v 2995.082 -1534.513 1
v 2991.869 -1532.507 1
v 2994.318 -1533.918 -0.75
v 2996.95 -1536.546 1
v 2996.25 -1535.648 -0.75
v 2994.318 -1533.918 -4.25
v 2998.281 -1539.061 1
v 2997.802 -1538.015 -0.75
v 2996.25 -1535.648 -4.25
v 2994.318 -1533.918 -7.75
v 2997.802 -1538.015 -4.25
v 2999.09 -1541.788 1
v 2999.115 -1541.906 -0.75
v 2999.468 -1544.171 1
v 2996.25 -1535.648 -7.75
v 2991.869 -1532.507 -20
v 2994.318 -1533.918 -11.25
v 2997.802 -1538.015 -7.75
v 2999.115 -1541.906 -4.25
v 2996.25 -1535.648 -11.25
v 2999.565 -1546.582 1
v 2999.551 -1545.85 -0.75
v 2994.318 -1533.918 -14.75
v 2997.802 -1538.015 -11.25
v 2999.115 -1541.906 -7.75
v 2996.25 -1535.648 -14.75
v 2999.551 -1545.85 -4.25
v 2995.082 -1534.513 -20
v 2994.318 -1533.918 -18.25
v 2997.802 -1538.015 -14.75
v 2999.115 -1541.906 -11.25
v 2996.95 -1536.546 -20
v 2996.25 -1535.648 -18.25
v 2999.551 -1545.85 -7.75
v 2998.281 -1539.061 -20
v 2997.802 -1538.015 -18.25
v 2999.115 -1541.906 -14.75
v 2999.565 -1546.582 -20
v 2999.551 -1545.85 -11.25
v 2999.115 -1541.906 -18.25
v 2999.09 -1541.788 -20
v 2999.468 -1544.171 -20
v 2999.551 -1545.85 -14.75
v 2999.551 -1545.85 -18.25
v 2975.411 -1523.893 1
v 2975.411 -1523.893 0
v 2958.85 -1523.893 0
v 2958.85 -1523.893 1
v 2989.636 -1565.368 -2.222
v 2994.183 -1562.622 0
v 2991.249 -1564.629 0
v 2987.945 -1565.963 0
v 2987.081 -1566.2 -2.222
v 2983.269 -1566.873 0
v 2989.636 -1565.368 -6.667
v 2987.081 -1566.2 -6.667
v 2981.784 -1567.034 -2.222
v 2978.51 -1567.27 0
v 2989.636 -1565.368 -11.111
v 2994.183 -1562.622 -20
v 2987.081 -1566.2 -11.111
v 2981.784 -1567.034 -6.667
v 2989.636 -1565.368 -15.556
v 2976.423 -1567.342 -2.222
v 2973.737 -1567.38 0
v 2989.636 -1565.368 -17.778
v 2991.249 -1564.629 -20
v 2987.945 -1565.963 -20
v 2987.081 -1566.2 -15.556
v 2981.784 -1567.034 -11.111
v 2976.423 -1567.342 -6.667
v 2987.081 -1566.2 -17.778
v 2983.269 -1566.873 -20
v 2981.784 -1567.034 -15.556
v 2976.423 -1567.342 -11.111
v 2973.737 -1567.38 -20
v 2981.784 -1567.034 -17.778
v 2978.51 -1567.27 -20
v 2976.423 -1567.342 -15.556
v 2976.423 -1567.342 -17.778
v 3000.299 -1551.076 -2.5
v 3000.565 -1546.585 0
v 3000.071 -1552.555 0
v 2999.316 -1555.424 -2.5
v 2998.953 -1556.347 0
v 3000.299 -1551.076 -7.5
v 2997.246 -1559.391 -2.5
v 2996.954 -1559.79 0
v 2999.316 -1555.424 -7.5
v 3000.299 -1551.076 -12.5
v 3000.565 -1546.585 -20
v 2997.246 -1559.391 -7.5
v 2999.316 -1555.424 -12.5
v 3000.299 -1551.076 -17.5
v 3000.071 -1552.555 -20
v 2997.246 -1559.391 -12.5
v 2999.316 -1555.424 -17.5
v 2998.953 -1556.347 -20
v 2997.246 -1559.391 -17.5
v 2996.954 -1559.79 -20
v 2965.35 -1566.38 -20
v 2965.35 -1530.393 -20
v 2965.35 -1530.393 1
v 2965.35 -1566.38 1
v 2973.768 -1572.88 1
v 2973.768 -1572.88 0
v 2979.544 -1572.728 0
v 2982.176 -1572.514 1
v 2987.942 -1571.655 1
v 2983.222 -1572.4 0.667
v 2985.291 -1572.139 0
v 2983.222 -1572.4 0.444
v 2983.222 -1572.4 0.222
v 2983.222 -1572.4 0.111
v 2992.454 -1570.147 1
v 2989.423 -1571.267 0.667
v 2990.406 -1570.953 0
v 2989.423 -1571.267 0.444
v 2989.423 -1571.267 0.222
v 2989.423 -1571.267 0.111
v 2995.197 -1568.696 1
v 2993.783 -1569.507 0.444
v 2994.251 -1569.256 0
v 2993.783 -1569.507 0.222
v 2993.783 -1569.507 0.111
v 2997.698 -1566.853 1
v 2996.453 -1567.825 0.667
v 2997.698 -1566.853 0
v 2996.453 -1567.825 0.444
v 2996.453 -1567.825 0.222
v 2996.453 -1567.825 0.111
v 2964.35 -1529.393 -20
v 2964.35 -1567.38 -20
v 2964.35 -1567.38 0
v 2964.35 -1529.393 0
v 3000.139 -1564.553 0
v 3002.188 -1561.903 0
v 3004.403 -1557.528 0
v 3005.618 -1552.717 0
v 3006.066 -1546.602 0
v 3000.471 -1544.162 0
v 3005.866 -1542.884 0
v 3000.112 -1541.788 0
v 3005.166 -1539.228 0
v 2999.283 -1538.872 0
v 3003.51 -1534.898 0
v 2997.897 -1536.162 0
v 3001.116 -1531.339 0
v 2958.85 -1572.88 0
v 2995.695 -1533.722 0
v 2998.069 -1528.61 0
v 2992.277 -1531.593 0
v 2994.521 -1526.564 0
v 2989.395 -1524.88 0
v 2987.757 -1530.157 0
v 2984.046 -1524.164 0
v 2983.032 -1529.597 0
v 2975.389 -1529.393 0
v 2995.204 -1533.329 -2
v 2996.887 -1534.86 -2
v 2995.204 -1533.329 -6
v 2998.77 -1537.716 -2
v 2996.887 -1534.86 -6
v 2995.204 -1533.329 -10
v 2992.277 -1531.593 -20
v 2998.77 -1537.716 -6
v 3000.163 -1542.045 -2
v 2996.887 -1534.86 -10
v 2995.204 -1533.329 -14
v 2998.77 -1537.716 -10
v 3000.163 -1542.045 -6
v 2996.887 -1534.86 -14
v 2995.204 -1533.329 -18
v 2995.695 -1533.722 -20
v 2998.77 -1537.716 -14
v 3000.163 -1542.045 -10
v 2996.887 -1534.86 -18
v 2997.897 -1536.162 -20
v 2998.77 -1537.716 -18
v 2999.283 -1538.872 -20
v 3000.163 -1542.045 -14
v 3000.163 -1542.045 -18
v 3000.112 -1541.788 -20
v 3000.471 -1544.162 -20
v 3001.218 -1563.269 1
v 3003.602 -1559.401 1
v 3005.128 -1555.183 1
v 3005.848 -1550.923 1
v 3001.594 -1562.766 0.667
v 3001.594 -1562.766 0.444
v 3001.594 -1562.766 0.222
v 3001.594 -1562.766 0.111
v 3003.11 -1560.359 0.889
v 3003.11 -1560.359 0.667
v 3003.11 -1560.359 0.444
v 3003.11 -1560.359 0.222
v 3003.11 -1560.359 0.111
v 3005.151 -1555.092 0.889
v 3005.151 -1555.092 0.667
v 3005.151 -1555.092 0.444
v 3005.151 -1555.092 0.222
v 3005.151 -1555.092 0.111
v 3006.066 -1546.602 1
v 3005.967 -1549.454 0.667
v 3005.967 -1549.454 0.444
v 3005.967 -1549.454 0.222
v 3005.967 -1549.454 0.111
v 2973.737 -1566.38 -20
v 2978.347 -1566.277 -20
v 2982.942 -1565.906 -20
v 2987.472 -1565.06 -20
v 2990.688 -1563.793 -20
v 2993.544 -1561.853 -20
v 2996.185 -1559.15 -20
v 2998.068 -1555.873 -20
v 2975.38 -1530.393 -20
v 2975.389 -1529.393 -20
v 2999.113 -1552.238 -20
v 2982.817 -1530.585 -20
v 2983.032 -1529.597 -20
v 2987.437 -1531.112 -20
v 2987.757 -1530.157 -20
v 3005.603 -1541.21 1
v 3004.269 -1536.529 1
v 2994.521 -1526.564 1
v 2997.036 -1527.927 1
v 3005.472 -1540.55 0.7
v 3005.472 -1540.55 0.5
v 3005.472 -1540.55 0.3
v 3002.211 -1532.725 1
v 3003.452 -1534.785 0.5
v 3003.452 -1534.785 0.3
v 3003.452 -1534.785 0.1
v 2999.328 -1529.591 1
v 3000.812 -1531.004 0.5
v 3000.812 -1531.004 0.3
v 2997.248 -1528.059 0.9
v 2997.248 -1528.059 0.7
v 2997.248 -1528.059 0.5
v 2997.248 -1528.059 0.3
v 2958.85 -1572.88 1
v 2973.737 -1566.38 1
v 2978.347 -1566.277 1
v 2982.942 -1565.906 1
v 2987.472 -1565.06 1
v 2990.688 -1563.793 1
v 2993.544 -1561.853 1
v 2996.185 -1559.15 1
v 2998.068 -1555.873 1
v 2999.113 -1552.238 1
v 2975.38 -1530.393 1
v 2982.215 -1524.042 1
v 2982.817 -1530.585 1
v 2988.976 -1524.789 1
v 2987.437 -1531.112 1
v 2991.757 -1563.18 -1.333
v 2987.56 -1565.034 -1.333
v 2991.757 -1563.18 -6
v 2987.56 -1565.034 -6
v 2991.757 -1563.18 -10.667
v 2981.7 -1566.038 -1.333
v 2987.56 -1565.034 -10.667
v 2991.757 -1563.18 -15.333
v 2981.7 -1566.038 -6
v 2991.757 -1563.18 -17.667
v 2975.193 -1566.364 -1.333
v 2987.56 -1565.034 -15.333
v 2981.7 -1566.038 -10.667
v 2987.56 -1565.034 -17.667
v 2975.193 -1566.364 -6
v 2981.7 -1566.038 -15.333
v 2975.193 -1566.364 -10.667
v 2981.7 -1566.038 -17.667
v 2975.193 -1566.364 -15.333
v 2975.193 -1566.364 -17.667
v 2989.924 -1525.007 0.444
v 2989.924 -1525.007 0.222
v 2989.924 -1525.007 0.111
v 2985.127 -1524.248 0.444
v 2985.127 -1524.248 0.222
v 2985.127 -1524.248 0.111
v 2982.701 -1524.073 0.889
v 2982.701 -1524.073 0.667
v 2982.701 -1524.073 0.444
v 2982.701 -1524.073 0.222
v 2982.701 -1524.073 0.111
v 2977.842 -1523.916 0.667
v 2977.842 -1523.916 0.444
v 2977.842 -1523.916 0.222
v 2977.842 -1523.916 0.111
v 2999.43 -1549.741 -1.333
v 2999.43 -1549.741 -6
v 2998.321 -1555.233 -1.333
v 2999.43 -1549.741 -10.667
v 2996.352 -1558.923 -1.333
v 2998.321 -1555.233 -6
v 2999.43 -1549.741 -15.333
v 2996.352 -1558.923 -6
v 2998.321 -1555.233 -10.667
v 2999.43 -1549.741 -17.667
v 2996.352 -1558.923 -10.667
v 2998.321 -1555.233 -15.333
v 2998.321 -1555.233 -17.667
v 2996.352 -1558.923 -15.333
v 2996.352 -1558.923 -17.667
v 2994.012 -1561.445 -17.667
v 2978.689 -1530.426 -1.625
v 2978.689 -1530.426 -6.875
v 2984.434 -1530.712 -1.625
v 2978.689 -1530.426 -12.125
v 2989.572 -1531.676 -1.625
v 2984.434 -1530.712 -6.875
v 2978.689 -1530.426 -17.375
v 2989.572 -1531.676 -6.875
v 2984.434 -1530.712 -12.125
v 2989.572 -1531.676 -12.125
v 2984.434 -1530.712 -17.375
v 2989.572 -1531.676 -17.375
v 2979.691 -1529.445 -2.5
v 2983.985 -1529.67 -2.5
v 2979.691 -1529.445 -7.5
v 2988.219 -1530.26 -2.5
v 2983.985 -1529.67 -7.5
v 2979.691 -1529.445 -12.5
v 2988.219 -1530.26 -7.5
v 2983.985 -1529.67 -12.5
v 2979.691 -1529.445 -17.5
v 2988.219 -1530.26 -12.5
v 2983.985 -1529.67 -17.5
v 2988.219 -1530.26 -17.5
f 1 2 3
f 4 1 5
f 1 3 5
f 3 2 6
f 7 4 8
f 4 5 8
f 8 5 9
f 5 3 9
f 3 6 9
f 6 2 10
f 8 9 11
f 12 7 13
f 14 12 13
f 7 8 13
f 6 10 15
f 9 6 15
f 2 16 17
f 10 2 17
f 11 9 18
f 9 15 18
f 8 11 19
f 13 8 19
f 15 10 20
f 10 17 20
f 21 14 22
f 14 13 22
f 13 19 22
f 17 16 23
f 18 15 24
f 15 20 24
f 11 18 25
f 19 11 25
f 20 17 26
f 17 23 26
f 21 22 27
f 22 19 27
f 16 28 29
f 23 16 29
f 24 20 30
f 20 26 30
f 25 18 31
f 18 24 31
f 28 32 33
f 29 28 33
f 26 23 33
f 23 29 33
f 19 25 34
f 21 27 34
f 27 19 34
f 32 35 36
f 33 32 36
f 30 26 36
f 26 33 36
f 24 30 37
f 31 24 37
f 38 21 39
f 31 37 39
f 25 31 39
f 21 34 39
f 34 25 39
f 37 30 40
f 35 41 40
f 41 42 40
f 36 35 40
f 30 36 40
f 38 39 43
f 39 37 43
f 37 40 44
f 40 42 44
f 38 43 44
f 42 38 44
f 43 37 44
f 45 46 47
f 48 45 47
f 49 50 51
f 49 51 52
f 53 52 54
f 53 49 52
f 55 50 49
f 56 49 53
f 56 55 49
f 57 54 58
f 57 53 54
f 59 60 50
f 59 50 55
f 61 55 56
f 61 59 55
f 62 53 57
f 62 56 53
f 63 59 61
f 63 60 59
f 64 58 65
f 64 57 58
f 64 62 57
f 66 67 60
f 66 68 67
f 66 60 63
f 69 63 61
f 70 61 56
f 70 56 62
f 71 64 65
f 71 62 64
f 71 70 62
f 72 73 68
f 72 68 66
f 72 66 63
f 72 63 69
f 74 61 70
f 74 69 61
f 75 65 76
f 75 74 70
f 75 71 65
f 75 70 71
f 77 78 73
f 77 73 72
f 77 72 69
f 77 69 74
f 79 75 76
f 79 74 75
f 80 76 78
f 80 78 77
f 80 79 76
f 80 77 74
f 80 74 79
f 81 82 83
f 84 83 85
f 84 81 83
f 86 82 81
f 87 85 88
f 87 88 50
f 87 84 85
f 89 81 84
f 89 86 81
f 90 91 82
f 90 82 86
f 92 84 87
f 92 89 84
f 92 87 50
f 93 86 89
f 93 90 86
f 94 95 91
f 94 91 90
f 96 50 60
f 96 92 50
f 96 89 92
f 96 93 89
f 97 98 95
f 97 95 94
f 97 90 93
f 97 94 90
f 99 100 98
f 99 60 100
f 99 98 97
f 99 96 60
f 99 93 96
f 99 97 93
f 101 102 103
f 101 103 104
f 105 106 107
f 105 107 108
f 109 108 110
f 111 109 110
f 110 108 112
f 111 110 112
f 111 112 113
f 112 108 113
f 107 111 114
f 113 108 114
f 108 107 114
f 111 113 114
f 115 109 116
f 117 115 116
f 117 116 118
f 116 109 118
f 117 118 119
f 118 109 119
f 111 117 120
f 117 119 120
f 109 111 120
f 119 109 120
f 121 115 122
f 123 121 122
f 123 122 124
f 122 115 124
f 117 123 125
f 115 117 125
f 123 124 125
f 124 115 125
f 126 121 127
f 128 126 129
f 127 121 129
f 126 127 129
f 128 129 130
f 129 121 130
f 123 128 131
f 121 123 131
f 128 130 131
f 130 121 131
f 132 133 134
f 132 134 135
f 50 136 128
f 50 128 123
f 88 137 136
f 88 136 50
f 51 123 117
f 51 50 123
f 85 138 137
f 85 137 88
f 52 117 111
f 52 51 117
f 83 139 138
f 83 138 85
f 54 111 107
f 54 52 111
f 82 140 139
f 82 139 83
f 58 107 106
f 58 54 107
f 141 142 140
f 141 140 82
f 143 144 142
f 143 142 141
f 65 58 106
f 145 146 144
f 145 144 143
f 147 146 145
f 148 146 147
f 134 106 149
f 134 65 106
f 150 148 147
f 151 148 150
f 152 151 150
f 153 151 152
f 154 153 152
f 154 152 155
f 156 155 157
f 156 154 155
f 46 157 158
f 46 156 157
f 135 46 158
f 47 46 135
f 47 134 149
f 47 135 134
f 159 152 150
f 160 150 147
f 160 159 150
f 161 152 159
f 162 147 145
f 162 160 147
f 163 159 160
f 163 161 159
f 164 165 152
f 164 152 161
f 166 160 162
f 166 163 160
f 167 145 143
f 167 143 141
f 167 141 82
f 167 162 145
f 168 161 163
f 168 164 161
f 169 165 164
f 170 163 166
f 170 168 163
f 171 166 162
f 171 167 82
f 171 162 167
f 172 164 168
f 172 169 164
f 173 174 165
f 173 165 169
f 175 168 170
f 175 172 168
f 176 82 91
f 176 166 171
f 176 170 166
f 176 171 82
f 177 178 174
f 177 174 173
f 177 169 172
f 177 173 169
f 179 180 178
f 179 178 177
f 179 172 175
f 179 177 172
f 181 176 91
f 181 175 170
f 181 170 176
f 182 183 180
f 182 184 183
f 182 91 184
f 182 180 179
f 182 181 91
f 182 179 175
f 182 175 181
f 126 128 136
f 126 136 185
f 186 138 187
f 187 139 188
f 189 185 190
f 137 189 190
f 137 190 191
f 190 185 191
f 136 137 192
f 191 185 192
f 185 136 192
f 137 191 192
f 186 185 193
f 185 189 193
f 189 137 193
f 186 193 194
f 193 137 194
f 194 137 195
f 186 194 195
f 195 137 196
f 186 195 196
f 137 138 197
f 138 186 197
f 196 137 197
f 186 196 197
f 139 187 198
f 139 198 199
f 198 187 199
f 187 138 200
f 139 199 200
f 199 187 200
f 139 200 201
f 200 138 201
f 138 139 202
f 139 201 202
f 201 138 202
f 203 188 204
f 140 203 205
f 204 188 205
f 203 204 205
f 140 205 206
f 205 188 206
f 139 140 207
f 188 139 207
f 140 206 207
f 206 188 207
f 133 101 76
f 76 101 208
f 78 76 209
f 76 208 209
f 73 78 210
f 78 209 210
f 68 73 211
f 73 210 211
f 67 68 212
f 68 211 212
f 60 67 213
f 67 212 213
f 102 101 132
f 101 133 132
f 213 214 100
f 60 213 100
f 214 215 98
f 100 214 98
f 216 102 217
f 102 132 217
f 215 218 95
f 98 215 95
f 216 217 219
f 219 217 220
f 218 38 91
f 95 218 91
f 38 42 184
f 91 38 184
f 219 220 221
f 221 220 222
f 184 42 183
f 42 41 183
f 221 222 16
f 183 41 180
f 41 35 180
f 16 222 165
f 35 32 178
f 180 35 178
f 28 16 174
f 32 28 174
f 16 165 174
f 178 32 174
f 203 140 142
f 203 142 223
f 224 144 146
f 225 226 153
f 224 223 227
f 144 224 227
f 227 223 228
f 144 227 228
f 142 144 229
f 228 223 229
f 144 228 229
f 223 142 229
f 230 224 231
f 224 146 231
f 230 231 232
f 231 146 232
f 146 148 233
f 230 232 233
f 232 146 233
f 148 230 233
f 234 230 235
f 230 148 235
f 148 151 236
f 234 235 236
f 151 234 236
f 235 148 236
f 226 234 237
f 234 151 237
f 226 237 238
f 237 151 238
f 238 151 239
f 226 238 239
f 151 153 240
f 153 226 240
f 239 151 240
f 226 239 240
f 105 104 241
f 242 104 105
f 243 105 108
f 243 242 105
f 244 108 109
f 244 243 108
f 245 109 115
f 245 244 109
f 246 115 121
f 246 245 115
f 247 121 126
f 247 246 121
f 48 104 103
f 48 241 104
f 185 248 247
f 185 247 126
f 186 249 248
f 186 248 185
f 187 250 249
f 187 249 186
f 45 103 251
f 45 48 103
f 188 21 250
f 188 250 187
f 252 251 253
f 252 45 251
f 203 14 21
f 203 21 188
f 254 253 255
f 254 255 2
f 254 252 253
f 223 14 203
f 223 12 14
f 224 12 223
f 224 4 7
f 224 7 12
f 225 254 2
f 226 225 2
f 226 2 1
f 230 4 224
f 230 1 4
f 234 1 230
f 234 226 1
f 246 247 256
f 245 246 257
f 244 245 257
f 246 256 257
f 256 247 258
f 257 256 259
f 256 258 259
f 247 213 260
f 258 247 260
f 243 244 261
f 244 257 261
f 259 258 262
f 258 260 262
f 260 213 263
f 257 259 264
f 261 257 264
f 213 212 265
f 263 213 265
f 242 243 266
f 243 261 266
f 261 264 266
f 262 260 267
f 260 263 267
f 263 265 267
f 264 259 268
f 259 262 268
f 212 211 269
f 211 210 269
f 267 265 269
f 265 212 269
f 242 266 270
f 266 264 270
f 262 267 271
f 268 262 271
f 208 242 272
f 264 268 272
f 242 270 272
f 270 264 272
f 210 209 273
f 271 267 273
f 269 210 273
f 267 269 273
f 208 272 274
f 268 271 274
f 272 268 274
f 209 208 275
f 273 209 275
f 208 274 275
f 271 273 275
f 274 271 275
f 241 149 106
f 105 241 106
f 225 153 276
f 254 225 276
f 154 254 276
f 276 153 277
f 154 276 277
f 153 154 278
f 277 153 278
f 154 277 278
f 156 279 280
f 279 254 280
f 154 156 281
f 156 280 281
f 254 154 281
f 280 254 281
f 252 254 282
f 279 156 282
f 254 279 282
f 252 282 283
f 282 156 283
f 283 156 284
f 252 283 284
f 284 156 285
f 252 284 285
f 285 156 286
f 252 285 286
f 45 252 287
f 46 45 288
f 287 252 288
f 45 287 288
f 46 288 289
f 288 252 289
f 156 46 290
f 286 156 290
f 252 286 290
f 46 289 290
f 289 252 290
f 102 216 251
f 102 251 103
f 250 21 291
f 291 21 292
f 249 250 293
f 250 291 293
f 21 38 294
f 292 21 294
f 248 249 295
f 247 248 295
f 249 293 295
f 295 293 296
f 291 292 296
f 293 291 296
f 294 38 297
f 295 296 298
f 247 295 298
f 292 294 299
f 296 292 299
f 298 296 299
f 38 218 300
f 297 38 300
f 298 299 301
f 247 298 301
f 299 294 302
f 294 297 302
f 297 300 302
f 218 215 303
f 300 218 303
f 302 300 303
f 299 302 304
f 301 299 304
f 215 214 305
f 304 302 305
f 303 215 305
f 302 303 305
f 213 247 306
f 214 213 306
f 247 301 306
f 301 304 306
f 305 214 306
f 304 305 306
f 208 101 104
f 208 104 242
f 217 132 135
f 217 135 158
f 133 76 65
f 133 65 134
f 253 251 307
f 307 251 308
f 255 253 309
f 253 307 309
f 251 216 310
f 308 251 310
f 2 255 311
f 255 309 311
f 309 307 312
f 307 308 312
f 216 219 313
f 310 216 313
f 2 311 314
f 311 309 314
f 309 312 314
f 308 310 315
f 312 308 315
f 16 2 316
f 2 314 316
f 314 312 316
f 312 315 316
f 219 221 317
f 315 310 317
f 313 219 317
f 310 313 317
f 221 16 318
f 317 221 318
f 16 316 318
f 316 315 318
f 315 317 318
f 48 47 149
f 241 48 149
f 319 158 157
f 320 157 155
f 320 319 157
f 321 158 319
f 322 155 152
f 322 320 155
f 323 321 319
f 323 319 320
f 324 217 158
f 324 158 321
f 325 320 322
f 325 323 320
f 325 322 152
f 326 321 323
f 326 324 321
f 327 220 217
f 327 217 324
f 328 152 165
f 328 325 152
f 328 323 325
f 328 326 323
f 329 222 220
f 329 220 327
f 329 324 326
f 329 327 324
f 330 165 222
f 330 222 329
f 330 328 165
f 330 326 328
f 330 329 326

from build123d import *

# Parameters (mm, degrees)
BOSS_EXTRUDE1_DEPTH      = 1
BOSS_EXTRUDE1_DEPTH_BACK = 20
CUT_EXTRUDE1_START       = -20
CUT_EXTRUDE1_DEPTH       = 21
CUT_EXTRUDE2_DEPTH       = 20


with BuildPart() as part:
    # Sketch1 → Boss-Extrude1 (new, two sides: drawn at the far end of the back side and taken through both)
    with BuildSketch(Plane.XY.offset(-BOSS_EXTRUDE1_DEPTH_BACK)):
        with BuildLine():
            Line((2958.849681818, -1523.892686603), (2958.849681818, -1572.880046193))
            Line((2958.849681818, -1572.880046193), (2973.767827756, -1572.879891925))
            add(Edge.make_bspline(
                [(2973.767827756, -1572.879891925), (2975.872692571, -1572.860128702), (2977.97744433, -1572.837038501), (2981.128456873, -1572.622449637), (2982.176837562, -1572.520411147), (2984.266901408, -1572.279675791), (2985.310881123, -1572.151531628), (2987.385467262, -1571.796406217), (2988.418665053, -1571.564661717), (2990.42772202, -1570.970030606), (2991.407545952, -1570.607613705), (2992.843658133, -1569.975383258), (2993.316892991, -1569.750227353), (2994.249877125, -1569.26437839), (2994.710462552, -1569.002807433), (2995.600777329, -1568.440961858), (2996.03179999, -1568.139919647), (2996.874381171, -1567.510129893), (2997.286151137, -1567.181683323), (2997.698061708, -1566.853436892)],
                knots=[0, 0, 0, 0, 0.25, 0.25, 0.375, 0.375, 0.5, 0.5, 0.625, 0.625, 0.75, 0.75, 0.8125, 0.8125, 0.875, 0.875, 0.9375, 0.9375, 1, 1, 1, 1], degree=3))
            add(Edge.make_bspline(
                [(2997.698061708, -1566.853436892), (2998.416858499, -1566.231137048), (2999.132070809, -1565.605801223), (3000.439874878, -1564.251272502), (3001.040833723, -1563.529166355), (3001.870136359, -1562.384909745), (3002.134518134, -1561.99328271), (3002.639885881, -1561.190212879), (3002.88181464, -1560.777345774), (3003.56629642, -1559.520937412), (3003.965060607, -1558.663443678), (3004.645255929, -1556.907913122), (3004.925665177, -1556.009523199), (3005.375924175, -1554.174540788), (3005.547442261, -1553.235046422), (3005.815340161, -1551.349261322), (3005.909922946, -1550.403292778), (3006.024485076, -1548.505526326), (3006.044953808, -1547.553766658), (3006.065724013, -1546.602030546)],
                knots=[0, 0, 0, 0, 0.125, 0.125, 0.25, 0.25, 0.3125, 0.3125, 0.375, 0.375, 0.5, 0.5, 0.625, 0.625, 0.75, 0.75, 0.875, 0.875, 1, 1, 1, 1], degree=3))
            add(Edge.make_bspline(
                [(3006.065724013, -1546.602030546), (3006.04972175, -1545.577792039), (3006.031144664, -1544.554036514), (3005.843675505, -1542.534721285), (3005.678530811, -1541.538458655), (3005.265660908, -1539.561423704), (3005.017072922, -1538.580813221), (3004.349249805, -1536.651601947), (3003.927156281, -1535.69691585), (3002.976116906, -1533.87389373), (3002.441259888, -1533.000385871), (3001.502343695, -1531.777630592), (3001.167345475, -1531.384044934), (3000.455968626, -1530.623807652), (3000.085403132, -1530.263220064), (2998.936287392, -1529.230582402), (2998.119310629, -1528.608979786), (2996.812178732, -1527.783790373), (2996.362427394, -1527.526882528), (2995.447591339, -1527.034344288), (2994.984254165, -1526.799477811), (2994.521463917, -1526.563557737)],
                knots=[0, 0, 0, 0, 0.125, 0.125, 0.25, 0.25, 0.375, 0.375, 0.5, 0.5, 0.625, 0.625, 0.6875, 0.6875, 0.75, 0.75, 0.875, 0.875, 0.9375, 0.9375, 1, 1, 1, 1], degree=3))
            add(Edge.make_bspline(
                [(2994.521463917, -1526.563557737), (2993.765688091, -1526.272085638), (2993.010491549, -1525.978829783), (2991.483205477, -1525.44433573), (2990.710657636, -1525.204508785), (2989.138204589, -1524.809094938), (2988.339258152, -1524.653193843), (2986.738448585, -1524.406676163), (2985.933779187, -1524.317100974), (2984.722952021, -1524.212934338), (2984.318693535, -1524.183341594), (2983.509822186, -1524.126955112), (2983.105306438, -1524.099165519), (2981.891730085, -1524.019688984), (2981.082356745, -1523.977557139), (2979.462489648, -1523.931004115), (2978.652062316, -1523.924347209), (2977.031290954, -1523.90822966), (2976.220898612, -1523.900395057), (2975.410500017, -1523.892770911)],
                knots=[0, 0, 0, 0, 0.125, 0.125, 0.25, 0.25, 0.375, 0.375, 0.5, 0.5, 0.5625, 0.5625, 0.625, 0.625, 0.75, 0.75, 0.875, 0.875, 1, 1, 1, 1], degree=3))
            Line((2975.410500017, -1523.892770911), (2958.849681818, -1523.892686603))
        make_face()
    extrude(amount=BOSS_EXTRUDE1_DEPTH + BOSS_EXTRUDE1_DEPTH_BACK)

    # Cut-Extrude1: read off the stored shape, not the designer's step
    # Cut-Extrude1 outline → Cut-Extrude1 (cut)
    with BuildSketch(Plane.XY.offset(CUT_EXTRUDE1_START)):
        with BuildLine():
            add(Edge.make_bspline(
                [(2999.564611356, -1546.581932516), (2999.560199289, -1546.783286703), (2999.555713556, -1546.984640418), (2999.550951057, -1547.185992362), (2999.534489795, -1547.818236531), (2999.511294548, -1548.450437603), (2999.490831378, -1548.881110798), (2999.426611827, -1549.918234738), (2999.317611548, -1550.952232563), (2999.236483512, -1551.555232979), (2999.050783989, -1552.664033717), (2998.792033815, -1553.759793947), (2998.6557005, -1554.257958858), (2998.364859869, -1555.173667396), (2997.997352466, -1556.061024659), (2997.811925548, -1556.465364546), (2997.43514021, -1557.215812724), (2997.011924898, -1557.940652406), (2996.802455573, -1558.275235324), (2996.352584868, -1558.945006303), (2995.85768673, -1559.583161975), (2995.59297997, -1559.899565762), (2995.129592401, -1560.411063384), (2994.63189911, -1560.888356369), (2994.427352751, -1561.076325072), (2994.127451293, -1561.344110455), (2993.824926371, -1561.608514143), (2993.731268531, -1561.689977202), (2993.637497837, -1561.77129479), (2993.543683098, -1561.852555602)],
                knots=[0, 0, 0, 0, 0, 0, 0.059110167, 0.059110167, 0.059110167, 0.18560848, 0.18560848, 0.18560848, 0.363995279, 0.363995279, 0.363995279, 0.515214101, 0.515214101, 0.515214101, 0.645558691, 0.645558691, 0.645558691, 0.761279311, 0.761279311, 0.761279311, 0.882110137, 0.882110137, 0.882110137, 0.9635736, 0.9635736, 0.9635736, 1, 1, 1, 1, 1, 1], degree=5))
            add(Edge.make_bspline(
                [(2991.86894481, -1532.507311664), (2991.917727188, -1532.532220868), (2991.966502744, -1532.557143307), (2992.015269625, -1532.582082572), (2992.251762506, -1532.703149616), (2992.487964167, -1532.824781606), (2992.674876093, -1532.922484624), (2993.125152768, -1533.163819253), (2993.567139203, -1533.421165934), (2993.822697838, -1533.578813476), (2994.295211081, -1533.89045171), (2994.745988195, -1534.232754351), (2994.953066018, -1534.399748188), (2995.348862625, -1534.737107468), (2995.727539885, -1535.093636559), (2995.9075968, -1535.272751981), (2996.258392012, -1535.643974504), (2996.582901118, -1536.038753857), (2996.739291373, -1536.242815654), (2997.069559841, -1536.705108563), (2997.364851967, -1537.189961311), (2997.517596496, -1537.460995945), (2997.841182076, -1538.074085206), (2998.135390571, -1538.70208923), (2998.286730018, -1539.052742318), (2998.586377385, -1539.820367574), (2998.818630505, -1540.610699075), (2998.927804824, -1541.039958158), (2999.12917984, -1541.932899013), (2999.297418906, -1542.832012438), (2999.372220021, -1543.297429752), (2999.47290564, -1544.085611102), (2999.521569818, -1544.87895901), (2999.534967442, -1545.202600808), (2999.548302092, -1545.672889571), (2999.55740139, -1546.142922786), (2999.559941505, -1546.289267601), (2999.562305702, -1546.435601801), (2999.564611356, -1546.581932516)],
                knots=[0, 0, 0, 0, 0, 0, 0.016030085, 0.016030085, 0.016030085, 0.077753986, 0.077753986, 0.077753986, 0.16552737, 0.16552737, 0.16552737, 0.243297834, 0.243297834, 0.243297834, 0.317540058, 0.317540058, 0.317540058, 0.392660664, 0.392660664, 0.392660664, 0.483601528, 0.483601528, 0.483601528, 0.595188602, 0.595188602, 0.595188602, 0.724612519, 0.724612519, 0.724612519, 0.862455293, 0.862455293, 0.862455293, 0.957170285, 0.957170285, 0.957170285, 1, 1, 1, 1, 1, 1], degree=5))
            add(Edge.make_bspline(
                [(2975.379908678, -1530.392770753), (2975.635320758, -1530.395173553), (2975.890732771, -1530.397574462), (2976.146143794, -1530.399947135), (2976.8080658, -1530.40595474), (2977.469968724, -1530.411418814), (2977.87646884, -1530.415148123), (2978.89820325, -1530.426914914), (2979.920008426, -1530.448352542), (2980.53513518, -1530.466136469), (2981.684749787, -1530.511066357), (2982.832663167, -1530.582616061), (2983.366418547, -1530.621116564), (2984.420849653, -1530.706422764), (2985.4751468, -1530.807833622), (2985.994763952, -1530.86696457), (2987.032496202, -1531.013952985), (2988.056756518, -1531.238439658), (2988.566475319, -1531.3687841), (2989.402610593, -1531.61104315), (2990.225391079, -1531.892622818), (2990.549250324, -1532.008765811), (2991.007473299, -1532.178445738), (2991.464114808, -1532.351995365), (2991.599123107, -1532.403608526), (2991.734055949, -1532.455406322), (2991.86894481, -1532.507311664)],
                knots=[0, 0, 0, 0, 0, 0, 0.076276008, 0.076276008, 0.076276008, 0.197678027, 0.197678027, 0.197678027, 0.381415094, 0.381415094, 0.381415094, 0.541241886, 0.541241886, 0.541241886, 0.697238276, 0.697238276, 0.697238276, 0.854134567, 0.854134567, 0.854134567, 0.956840005, 0.956840005, 0.956840005, 1, 1, 1, 1, 1, 1], degree=5))
            Line((2975.379908678, -1530.392770753), (2965.349681818, -1530.392719693))
            Line((2965.349681818, -1530.392719693), (2965.349681818, -1566.379978977))
            Line((2965.349681818, -1566.379978977), (2973.737278623, -1566.379892232))
            add(Edge.make_bspline(
                [(2993.543683098, -1561.852555602), (2993.43705716, -1561.937476509), (2993.330365459, -1562.022326296), (2993.223495243, -1562.106982773), (2992.873649724, -1562.382327169), (2992.519497173, -1562.653007554), (2992.270493978, -1562.836218126), (2991.638235683, -1563.275868304), (2990.969618174, -1563.658432897), (2990.558800189, -1563.869767569), (2989.723512863, -1564.261411184), (2988.868115868, -1564.603636603), (2988.436564341, -1564.761316131), (2987.473782291, -1565.078900946), (2986.490169119, -1565.325293296), (2985.947414782, -1565.442190979), (2984.775432084, -1565.662090525), (2983.59668737, -1565.830917986), (2982.965373607, -1565.908917719), (2981.564927724, -1566.059879807), (2980.16092745, -1566.174319224), (2979.390132346, -1566.226249634), (2978.088344511, -1566.295874359), (2976.785464801, -1566.335549007), (2976.254518882, -1566.347735739), (2975.43246573, -1566.361982789), (2974.610416716, -1566.371460546), (2974.319370561, -1566.3744135), (2974.028324587, -1566.377158998), (2973.737278623, -1566.379892232)],
                knots=[0, 0, 0, 0, 0, 0, 0.03284736, 0.03284736, 0.03284736, 0.107235325, 0.107235325, 0.107235325, 0.218311088, 0.218311088, 0.218311088, 0.32891581, 0.32891581, 0.32891581, 0.462511465, 0.462511465, 0.462511465, 0.615777025, 0.615777025, 0.615777025, 0.801895391, 0.801895391, 0.801895391, 0.929861051, 0.929861051, 0.929861051, 1, 1, 1, 1, 1, 1], degree=5))
        make_face()
    extrude(amount=CUT_EXTRUDE1_DEPTH, mode=Mode.SUBTRACT)

    # Sketch2 → Cut-Extrude2 (cut)
    with BuildSketch(Plane(origin=(0, 0, -20), x_dir=(-1, 0, 0), z_dir=(0, 0, -1))):
        with BuildLine():
            Line((-2957.849681818, -1522.892681513), (-2975.419907498, -1522.892815162))
            add(Edge.make_bspline(
                [(-2975.419907498, -1522.892815162), (-2976.250334374, -1522.900627732), (-2977.080757395, -1522.908729242), (-2978.741600844, -1522.925126531), (-2979.572036658, -1522.932269269), (-2981.232420395, -1522.983118316), (-2982.061496977, -1523.02818346), (-2983.718289186, -1523.137727375), (-2984.546744697, -1523.191563766), (-2987.028279746, -1523.413413606), (-2988.662085857, -1523.652133805), (-2991.047633593, -1524.261413977), (-2991.832280311, -1524.506234688), (-2993.387380634, -1525.052088003), (-2994.158200037, -1525.351671856), (-2994.929550957, -1525.649150637)],
                knots=[0, 0, 0, 0, 0.125, 0.125, 0.25, 0.25, 0.375, 0.375, 0.5, 0.5, 0.75, 0.75, 0.875, 0.875, 1, 1, 1, 1], degree=3))
            add(Edge.make_bspline(
                [(-2994.929550957, -1525.649150637), (-2995.409232135, -1525.893681329), (-2995.889730359, -1526.137017698), (-2996.835714913, -1526.645634188), (-2997.301119322, -1526.911034055), (-2998.658245611, -1527.764369291), (-2999.511453788, -1528.408602358), (-3000.71686701, -1529.483705329), (-3001.108604608, -1529.862021994), (-3001.851318486, -1530.647739857), (-3002.202171297, -1531.054671595), (-3003.189581135, -1532.320180911), (-3003.756855155, -1533.226310201), (-3004.512885574, -1534.650624513), (-3004.750968055, -1535.13749972), (-3005.190118191, -1536.122972609), (-3005.3908103, -1536.620756117), (-3005.929075328, -1538.131162213), (-3006.199138362, -1539.161828937), (-3006.643661707, -1541.248715215), (-3006.823045805, -1542.305802987), (-3007.02935589, -1544.451457064), (-3007.049069381, -1545.528225293), (-3007.065894477, -1546.605129948)],
                knots=[0, 0, 0, 0, 0.0625, 0.0625, 0.125, 0.125, 0.25, 0.25, 0.3125, 0.3125, 0.375, 0.375, 0.5, 0.5, 0.5625, 0.5625, 0.625, 0.625, 0.75, 0.75, 0.875, 0.875, 1, 1, 1, 1], degree=3))
            add(Edge.make_bspline(
                [(-3007.065894477, -1546.605129948), (-3007.044456506, -1547.58746456), (-3007.023250298, -1548.569833279), (-3006.903650049, -1550.523211261), (-3006.805488623, -1551.494254756), (-3006.52981926, -1553.424664605), (-3006.354332297, -1554.384328378), (-3006.003932348, -1555.810995614), (-3005.872235213, -1556.284358998), (-3005.576811436, -1557.2263721), (-3005.412396416, -1557.69660213), (-3004.87476536, -1559.081940399), (-3004.457658857, -1559.975471603), (-3003.750003335, -1561.273813802), (-3003.500626365, -1561.699691216), (-3002.973960243, -1562.537164273), (-3002.695606216, -1562.94988624), (-3001.824010444, -1564.152822926), (-3001.193978684, -1564.90932261), (-2999.828664579, -1566.3246153), (-2999.084867353, -1566.975503732), (-2998.337199384, -1567.622798859)],
                knots=[0, 0, 0, 0, 0.125, 0.125, 0.25, 0.25, 0.375, 0.375, 0.4375, 0.4375, 0.5, 0.5, 0.625, 0.625, 0.6875, 0.6875, 0.75, 0.75, 0.875, 0.875, 1, 1, 1, 1], degree=3))
            add(Edge.make_bspline(
                [(-2998.337199384, -1567.622798859), (-2997.913365817, -1567.960545411), (-2997.489658147, -1568.298519089), (-2996.625716683, -1568.94465248), (-2996.185361463, -1569.252593133), (-2994.829537971, -1570.113710199), (-2993.879873151, -1570.605194306), (-2992.410454455, -1571.261379859), (-2991.912946257, -1571.466213641), (-2990.901256815, -1571.845802181), (-2990.385362373, -1572.021050891), (-2988.827863795, -1572.493428008), (-2987.774736228, -1572.736832692), (-2985.6459865, -1573.114913088), (-2984.569922437, -1573.250376528), (-2982.416450681, -1573.500248094), (-2981.338757126, -1573.608089569), (-2978.100277906, -1573.835251204), (-2975.934169133, -1573.859555227), (-2973.767838097, -1573.879891925)],
                knots=[0, 0, 0, 0, 0.0625, 0.0625, 0.125, 0.125, 0.25, 0.25, 0.3125, 0.3125, 0.375, 0.375, 0.5, 0.5, 0.625, 0.625, 0.75, 0.75, 1, 1, 1, 1], degree=3))
            Line((-2973.767838097, -1573.879891925), (-2957.849681818, -1573.880056534))
            Line((-2957.849681818, -1573.880056534), (-2957.849681818, -1522.892681513))
        make_face()
        with BuildLine():
            Line((-2973.737288965, -1567.379892231), (-2964.349681818, -1567.379989319))
            Line((-2964.349681818, -1567.379989319), (-2964.349681818, -1529.392714603))
            Line((-2964.349681818, -1529.392714603), (-2975.389315804, -1529.392815001))
            add(Edge.make_bspline(
                [(-2975.389315804, -1529.392815001), (-2976.106260535, -1529.399559689), (-2976.823215402, -1529.405491602), (-2978.257103741, -1529.419071074), (-2978.974019618, -1529.428129562), (-2980.407650434, -1529.462359736), (-2981.124104007, -1529.487237714), (-2982.555620066, -1529.561520806), (-2983.270715614, -1529.61085026), (-2984.699880583, -1529.728387246), (-2985.413805133, -1529.792501111), (-2986.828454417, -1529.974367331), (-2987.528277292, -1530.097123904), (-2988.908922426, -1530.423240118), (-2989.590563958, -1530.623124297), (-2990.940267727, -1531.080497783), (-2991.608857588, -1531.335748836), (-2992.277010257, -1531.592854518)],
                knots=[0, 0, 0, 0, 0.125, 0.125, 0.25, 0.25, 0.375, 0.375, 0.5, 0.5, 0.625, 0.625, 0.75, 0.75, 0.875, 0.875, 1, 1, 1, 1], degree=3))
            add(Edge.make_bspline(
                [(-2992.277010257, -1531.592854518), (-2992.955756651, -1531.939435253), (-2993.634043222, -1532.286654634), (-2994.59367389, -1532.887760624), (-2994.904398476, -1533.100840865), (-2995.504213394, -1533.557049018), (-2995.793962098, -1533.799262524), (-2996.355692286, -1534.308366315), (-2996.627469068, -1534.575540908), (-2997.146047797, -1535.144577483), (-2997.389727343, -1535.444346315), (-2998.062435015, -1536.370238882), (-2998.435296079, -1537.032021566), (-2999.105396536, -1538.400114352), (-2999.399895255, -1539.114773791), (-2999.850889981, -1540.565534506), (-3000.018354006, -1541.30270848), (-3000.307313274, -1542.78639827), (-3000.421613337, -1543.5343763), (-3000.541976558, -1545.052328418), (-3000.552730174, -1545.820003699), (-3000.564783968, -1546.585009656)],
                knots=[0, 0, 0, 0, 0.125, 0.125, 0.1875, 0.1875, 0.25, 0.25, 0.3125, 0.3125, 0.375, 0.375, 0.5, 0.5, 0.625, 0.625, 0.75, 0.75, 0.875, 0.875, 1, 1, 1, 1], degree=3))
            add(Edge.make_bspline(
                [(-3000.564783968, -1546.585009656), (-3000.548346381, -1547.335174442), (-3000.530105179, -1548.085230206), (-3000.452098136, -1549.582831723), (-3000.391892697, -1550.330350903), (-3000.206685187, -1551.821472543), (-3000.083351717, -1552.558989793), (-2999.762764878, -1554.010612062), (-2999.564870924, -1554.725107496), (-2999.066508249, -1556.123228981), (-2998.764721841, -1556.80645848), (-2998.064854081, -1558.143937976), (-2997.674913022, -1558.784960275), (-2996.817164397, -1559.997265575), (-2996.34861061, -1560.570531634), (-2995.316965243, -1561.638710254), (-2994.750135974, -1562.130524995), (-2994.18281326, -1562.621930766)],
                knots=[0, 0, 0, 0, 0.125, 0.125, 0.25, 0.25, 0.375, 0.375, 0.5, 0.5, 0.625, 0.625, 0.75, 0.75, 0.875, 0.875, 1, 1, 1, 1], degree=3))
            add(Edge.make_bspline(
                [(-2994.18281326, -1562.621930766), (-2993.481010256, -1563.180870752), (-2992.776811922, -1563.735482295), (-2991.263038474, -1564.6542859), (-2990.461988423, -1565.033883044), (-2989.222628157, -1565.534999618), (-2988.802120937, -1565.689208), (-2987.946202992, -1565.968578473), (-2987.515053252, -1566.091646221), (-2986.213257108, -1566.41737874), (-2985.334741874, -1566.57906271), (-2983.566858629, -1566.845909478), (-2982.676251584, -1566.948870539), (-2980.892432913, -1567.119662829), (-2979.999699152, -1567.187510135), (-2978.212640579, -1567.289337452), (-2977.318255963, -1567.322044433), (-2975.528325063, -1567.362731024), (-2974.632815117, -1567.371484112), (-2973.737288965, -1567.379892231)],
                knots=[0, 0, 0, 0, 0.125, 0.125, 0.25, 0.25, 0.3125, 0.3125, 0.375, 0.375, 0.5, 0.5, 0.625, 0.625, 0.75, 0.75, 0.875, 0.875, 1, 1, 1, 1], degree=3))
        make_face(mode=Mode.SUBTRACT)
    extrude(amount=-CUT_EXTRUDE2_DEPTH, mode=Mode.SUBTRACT)


solid = part.part
